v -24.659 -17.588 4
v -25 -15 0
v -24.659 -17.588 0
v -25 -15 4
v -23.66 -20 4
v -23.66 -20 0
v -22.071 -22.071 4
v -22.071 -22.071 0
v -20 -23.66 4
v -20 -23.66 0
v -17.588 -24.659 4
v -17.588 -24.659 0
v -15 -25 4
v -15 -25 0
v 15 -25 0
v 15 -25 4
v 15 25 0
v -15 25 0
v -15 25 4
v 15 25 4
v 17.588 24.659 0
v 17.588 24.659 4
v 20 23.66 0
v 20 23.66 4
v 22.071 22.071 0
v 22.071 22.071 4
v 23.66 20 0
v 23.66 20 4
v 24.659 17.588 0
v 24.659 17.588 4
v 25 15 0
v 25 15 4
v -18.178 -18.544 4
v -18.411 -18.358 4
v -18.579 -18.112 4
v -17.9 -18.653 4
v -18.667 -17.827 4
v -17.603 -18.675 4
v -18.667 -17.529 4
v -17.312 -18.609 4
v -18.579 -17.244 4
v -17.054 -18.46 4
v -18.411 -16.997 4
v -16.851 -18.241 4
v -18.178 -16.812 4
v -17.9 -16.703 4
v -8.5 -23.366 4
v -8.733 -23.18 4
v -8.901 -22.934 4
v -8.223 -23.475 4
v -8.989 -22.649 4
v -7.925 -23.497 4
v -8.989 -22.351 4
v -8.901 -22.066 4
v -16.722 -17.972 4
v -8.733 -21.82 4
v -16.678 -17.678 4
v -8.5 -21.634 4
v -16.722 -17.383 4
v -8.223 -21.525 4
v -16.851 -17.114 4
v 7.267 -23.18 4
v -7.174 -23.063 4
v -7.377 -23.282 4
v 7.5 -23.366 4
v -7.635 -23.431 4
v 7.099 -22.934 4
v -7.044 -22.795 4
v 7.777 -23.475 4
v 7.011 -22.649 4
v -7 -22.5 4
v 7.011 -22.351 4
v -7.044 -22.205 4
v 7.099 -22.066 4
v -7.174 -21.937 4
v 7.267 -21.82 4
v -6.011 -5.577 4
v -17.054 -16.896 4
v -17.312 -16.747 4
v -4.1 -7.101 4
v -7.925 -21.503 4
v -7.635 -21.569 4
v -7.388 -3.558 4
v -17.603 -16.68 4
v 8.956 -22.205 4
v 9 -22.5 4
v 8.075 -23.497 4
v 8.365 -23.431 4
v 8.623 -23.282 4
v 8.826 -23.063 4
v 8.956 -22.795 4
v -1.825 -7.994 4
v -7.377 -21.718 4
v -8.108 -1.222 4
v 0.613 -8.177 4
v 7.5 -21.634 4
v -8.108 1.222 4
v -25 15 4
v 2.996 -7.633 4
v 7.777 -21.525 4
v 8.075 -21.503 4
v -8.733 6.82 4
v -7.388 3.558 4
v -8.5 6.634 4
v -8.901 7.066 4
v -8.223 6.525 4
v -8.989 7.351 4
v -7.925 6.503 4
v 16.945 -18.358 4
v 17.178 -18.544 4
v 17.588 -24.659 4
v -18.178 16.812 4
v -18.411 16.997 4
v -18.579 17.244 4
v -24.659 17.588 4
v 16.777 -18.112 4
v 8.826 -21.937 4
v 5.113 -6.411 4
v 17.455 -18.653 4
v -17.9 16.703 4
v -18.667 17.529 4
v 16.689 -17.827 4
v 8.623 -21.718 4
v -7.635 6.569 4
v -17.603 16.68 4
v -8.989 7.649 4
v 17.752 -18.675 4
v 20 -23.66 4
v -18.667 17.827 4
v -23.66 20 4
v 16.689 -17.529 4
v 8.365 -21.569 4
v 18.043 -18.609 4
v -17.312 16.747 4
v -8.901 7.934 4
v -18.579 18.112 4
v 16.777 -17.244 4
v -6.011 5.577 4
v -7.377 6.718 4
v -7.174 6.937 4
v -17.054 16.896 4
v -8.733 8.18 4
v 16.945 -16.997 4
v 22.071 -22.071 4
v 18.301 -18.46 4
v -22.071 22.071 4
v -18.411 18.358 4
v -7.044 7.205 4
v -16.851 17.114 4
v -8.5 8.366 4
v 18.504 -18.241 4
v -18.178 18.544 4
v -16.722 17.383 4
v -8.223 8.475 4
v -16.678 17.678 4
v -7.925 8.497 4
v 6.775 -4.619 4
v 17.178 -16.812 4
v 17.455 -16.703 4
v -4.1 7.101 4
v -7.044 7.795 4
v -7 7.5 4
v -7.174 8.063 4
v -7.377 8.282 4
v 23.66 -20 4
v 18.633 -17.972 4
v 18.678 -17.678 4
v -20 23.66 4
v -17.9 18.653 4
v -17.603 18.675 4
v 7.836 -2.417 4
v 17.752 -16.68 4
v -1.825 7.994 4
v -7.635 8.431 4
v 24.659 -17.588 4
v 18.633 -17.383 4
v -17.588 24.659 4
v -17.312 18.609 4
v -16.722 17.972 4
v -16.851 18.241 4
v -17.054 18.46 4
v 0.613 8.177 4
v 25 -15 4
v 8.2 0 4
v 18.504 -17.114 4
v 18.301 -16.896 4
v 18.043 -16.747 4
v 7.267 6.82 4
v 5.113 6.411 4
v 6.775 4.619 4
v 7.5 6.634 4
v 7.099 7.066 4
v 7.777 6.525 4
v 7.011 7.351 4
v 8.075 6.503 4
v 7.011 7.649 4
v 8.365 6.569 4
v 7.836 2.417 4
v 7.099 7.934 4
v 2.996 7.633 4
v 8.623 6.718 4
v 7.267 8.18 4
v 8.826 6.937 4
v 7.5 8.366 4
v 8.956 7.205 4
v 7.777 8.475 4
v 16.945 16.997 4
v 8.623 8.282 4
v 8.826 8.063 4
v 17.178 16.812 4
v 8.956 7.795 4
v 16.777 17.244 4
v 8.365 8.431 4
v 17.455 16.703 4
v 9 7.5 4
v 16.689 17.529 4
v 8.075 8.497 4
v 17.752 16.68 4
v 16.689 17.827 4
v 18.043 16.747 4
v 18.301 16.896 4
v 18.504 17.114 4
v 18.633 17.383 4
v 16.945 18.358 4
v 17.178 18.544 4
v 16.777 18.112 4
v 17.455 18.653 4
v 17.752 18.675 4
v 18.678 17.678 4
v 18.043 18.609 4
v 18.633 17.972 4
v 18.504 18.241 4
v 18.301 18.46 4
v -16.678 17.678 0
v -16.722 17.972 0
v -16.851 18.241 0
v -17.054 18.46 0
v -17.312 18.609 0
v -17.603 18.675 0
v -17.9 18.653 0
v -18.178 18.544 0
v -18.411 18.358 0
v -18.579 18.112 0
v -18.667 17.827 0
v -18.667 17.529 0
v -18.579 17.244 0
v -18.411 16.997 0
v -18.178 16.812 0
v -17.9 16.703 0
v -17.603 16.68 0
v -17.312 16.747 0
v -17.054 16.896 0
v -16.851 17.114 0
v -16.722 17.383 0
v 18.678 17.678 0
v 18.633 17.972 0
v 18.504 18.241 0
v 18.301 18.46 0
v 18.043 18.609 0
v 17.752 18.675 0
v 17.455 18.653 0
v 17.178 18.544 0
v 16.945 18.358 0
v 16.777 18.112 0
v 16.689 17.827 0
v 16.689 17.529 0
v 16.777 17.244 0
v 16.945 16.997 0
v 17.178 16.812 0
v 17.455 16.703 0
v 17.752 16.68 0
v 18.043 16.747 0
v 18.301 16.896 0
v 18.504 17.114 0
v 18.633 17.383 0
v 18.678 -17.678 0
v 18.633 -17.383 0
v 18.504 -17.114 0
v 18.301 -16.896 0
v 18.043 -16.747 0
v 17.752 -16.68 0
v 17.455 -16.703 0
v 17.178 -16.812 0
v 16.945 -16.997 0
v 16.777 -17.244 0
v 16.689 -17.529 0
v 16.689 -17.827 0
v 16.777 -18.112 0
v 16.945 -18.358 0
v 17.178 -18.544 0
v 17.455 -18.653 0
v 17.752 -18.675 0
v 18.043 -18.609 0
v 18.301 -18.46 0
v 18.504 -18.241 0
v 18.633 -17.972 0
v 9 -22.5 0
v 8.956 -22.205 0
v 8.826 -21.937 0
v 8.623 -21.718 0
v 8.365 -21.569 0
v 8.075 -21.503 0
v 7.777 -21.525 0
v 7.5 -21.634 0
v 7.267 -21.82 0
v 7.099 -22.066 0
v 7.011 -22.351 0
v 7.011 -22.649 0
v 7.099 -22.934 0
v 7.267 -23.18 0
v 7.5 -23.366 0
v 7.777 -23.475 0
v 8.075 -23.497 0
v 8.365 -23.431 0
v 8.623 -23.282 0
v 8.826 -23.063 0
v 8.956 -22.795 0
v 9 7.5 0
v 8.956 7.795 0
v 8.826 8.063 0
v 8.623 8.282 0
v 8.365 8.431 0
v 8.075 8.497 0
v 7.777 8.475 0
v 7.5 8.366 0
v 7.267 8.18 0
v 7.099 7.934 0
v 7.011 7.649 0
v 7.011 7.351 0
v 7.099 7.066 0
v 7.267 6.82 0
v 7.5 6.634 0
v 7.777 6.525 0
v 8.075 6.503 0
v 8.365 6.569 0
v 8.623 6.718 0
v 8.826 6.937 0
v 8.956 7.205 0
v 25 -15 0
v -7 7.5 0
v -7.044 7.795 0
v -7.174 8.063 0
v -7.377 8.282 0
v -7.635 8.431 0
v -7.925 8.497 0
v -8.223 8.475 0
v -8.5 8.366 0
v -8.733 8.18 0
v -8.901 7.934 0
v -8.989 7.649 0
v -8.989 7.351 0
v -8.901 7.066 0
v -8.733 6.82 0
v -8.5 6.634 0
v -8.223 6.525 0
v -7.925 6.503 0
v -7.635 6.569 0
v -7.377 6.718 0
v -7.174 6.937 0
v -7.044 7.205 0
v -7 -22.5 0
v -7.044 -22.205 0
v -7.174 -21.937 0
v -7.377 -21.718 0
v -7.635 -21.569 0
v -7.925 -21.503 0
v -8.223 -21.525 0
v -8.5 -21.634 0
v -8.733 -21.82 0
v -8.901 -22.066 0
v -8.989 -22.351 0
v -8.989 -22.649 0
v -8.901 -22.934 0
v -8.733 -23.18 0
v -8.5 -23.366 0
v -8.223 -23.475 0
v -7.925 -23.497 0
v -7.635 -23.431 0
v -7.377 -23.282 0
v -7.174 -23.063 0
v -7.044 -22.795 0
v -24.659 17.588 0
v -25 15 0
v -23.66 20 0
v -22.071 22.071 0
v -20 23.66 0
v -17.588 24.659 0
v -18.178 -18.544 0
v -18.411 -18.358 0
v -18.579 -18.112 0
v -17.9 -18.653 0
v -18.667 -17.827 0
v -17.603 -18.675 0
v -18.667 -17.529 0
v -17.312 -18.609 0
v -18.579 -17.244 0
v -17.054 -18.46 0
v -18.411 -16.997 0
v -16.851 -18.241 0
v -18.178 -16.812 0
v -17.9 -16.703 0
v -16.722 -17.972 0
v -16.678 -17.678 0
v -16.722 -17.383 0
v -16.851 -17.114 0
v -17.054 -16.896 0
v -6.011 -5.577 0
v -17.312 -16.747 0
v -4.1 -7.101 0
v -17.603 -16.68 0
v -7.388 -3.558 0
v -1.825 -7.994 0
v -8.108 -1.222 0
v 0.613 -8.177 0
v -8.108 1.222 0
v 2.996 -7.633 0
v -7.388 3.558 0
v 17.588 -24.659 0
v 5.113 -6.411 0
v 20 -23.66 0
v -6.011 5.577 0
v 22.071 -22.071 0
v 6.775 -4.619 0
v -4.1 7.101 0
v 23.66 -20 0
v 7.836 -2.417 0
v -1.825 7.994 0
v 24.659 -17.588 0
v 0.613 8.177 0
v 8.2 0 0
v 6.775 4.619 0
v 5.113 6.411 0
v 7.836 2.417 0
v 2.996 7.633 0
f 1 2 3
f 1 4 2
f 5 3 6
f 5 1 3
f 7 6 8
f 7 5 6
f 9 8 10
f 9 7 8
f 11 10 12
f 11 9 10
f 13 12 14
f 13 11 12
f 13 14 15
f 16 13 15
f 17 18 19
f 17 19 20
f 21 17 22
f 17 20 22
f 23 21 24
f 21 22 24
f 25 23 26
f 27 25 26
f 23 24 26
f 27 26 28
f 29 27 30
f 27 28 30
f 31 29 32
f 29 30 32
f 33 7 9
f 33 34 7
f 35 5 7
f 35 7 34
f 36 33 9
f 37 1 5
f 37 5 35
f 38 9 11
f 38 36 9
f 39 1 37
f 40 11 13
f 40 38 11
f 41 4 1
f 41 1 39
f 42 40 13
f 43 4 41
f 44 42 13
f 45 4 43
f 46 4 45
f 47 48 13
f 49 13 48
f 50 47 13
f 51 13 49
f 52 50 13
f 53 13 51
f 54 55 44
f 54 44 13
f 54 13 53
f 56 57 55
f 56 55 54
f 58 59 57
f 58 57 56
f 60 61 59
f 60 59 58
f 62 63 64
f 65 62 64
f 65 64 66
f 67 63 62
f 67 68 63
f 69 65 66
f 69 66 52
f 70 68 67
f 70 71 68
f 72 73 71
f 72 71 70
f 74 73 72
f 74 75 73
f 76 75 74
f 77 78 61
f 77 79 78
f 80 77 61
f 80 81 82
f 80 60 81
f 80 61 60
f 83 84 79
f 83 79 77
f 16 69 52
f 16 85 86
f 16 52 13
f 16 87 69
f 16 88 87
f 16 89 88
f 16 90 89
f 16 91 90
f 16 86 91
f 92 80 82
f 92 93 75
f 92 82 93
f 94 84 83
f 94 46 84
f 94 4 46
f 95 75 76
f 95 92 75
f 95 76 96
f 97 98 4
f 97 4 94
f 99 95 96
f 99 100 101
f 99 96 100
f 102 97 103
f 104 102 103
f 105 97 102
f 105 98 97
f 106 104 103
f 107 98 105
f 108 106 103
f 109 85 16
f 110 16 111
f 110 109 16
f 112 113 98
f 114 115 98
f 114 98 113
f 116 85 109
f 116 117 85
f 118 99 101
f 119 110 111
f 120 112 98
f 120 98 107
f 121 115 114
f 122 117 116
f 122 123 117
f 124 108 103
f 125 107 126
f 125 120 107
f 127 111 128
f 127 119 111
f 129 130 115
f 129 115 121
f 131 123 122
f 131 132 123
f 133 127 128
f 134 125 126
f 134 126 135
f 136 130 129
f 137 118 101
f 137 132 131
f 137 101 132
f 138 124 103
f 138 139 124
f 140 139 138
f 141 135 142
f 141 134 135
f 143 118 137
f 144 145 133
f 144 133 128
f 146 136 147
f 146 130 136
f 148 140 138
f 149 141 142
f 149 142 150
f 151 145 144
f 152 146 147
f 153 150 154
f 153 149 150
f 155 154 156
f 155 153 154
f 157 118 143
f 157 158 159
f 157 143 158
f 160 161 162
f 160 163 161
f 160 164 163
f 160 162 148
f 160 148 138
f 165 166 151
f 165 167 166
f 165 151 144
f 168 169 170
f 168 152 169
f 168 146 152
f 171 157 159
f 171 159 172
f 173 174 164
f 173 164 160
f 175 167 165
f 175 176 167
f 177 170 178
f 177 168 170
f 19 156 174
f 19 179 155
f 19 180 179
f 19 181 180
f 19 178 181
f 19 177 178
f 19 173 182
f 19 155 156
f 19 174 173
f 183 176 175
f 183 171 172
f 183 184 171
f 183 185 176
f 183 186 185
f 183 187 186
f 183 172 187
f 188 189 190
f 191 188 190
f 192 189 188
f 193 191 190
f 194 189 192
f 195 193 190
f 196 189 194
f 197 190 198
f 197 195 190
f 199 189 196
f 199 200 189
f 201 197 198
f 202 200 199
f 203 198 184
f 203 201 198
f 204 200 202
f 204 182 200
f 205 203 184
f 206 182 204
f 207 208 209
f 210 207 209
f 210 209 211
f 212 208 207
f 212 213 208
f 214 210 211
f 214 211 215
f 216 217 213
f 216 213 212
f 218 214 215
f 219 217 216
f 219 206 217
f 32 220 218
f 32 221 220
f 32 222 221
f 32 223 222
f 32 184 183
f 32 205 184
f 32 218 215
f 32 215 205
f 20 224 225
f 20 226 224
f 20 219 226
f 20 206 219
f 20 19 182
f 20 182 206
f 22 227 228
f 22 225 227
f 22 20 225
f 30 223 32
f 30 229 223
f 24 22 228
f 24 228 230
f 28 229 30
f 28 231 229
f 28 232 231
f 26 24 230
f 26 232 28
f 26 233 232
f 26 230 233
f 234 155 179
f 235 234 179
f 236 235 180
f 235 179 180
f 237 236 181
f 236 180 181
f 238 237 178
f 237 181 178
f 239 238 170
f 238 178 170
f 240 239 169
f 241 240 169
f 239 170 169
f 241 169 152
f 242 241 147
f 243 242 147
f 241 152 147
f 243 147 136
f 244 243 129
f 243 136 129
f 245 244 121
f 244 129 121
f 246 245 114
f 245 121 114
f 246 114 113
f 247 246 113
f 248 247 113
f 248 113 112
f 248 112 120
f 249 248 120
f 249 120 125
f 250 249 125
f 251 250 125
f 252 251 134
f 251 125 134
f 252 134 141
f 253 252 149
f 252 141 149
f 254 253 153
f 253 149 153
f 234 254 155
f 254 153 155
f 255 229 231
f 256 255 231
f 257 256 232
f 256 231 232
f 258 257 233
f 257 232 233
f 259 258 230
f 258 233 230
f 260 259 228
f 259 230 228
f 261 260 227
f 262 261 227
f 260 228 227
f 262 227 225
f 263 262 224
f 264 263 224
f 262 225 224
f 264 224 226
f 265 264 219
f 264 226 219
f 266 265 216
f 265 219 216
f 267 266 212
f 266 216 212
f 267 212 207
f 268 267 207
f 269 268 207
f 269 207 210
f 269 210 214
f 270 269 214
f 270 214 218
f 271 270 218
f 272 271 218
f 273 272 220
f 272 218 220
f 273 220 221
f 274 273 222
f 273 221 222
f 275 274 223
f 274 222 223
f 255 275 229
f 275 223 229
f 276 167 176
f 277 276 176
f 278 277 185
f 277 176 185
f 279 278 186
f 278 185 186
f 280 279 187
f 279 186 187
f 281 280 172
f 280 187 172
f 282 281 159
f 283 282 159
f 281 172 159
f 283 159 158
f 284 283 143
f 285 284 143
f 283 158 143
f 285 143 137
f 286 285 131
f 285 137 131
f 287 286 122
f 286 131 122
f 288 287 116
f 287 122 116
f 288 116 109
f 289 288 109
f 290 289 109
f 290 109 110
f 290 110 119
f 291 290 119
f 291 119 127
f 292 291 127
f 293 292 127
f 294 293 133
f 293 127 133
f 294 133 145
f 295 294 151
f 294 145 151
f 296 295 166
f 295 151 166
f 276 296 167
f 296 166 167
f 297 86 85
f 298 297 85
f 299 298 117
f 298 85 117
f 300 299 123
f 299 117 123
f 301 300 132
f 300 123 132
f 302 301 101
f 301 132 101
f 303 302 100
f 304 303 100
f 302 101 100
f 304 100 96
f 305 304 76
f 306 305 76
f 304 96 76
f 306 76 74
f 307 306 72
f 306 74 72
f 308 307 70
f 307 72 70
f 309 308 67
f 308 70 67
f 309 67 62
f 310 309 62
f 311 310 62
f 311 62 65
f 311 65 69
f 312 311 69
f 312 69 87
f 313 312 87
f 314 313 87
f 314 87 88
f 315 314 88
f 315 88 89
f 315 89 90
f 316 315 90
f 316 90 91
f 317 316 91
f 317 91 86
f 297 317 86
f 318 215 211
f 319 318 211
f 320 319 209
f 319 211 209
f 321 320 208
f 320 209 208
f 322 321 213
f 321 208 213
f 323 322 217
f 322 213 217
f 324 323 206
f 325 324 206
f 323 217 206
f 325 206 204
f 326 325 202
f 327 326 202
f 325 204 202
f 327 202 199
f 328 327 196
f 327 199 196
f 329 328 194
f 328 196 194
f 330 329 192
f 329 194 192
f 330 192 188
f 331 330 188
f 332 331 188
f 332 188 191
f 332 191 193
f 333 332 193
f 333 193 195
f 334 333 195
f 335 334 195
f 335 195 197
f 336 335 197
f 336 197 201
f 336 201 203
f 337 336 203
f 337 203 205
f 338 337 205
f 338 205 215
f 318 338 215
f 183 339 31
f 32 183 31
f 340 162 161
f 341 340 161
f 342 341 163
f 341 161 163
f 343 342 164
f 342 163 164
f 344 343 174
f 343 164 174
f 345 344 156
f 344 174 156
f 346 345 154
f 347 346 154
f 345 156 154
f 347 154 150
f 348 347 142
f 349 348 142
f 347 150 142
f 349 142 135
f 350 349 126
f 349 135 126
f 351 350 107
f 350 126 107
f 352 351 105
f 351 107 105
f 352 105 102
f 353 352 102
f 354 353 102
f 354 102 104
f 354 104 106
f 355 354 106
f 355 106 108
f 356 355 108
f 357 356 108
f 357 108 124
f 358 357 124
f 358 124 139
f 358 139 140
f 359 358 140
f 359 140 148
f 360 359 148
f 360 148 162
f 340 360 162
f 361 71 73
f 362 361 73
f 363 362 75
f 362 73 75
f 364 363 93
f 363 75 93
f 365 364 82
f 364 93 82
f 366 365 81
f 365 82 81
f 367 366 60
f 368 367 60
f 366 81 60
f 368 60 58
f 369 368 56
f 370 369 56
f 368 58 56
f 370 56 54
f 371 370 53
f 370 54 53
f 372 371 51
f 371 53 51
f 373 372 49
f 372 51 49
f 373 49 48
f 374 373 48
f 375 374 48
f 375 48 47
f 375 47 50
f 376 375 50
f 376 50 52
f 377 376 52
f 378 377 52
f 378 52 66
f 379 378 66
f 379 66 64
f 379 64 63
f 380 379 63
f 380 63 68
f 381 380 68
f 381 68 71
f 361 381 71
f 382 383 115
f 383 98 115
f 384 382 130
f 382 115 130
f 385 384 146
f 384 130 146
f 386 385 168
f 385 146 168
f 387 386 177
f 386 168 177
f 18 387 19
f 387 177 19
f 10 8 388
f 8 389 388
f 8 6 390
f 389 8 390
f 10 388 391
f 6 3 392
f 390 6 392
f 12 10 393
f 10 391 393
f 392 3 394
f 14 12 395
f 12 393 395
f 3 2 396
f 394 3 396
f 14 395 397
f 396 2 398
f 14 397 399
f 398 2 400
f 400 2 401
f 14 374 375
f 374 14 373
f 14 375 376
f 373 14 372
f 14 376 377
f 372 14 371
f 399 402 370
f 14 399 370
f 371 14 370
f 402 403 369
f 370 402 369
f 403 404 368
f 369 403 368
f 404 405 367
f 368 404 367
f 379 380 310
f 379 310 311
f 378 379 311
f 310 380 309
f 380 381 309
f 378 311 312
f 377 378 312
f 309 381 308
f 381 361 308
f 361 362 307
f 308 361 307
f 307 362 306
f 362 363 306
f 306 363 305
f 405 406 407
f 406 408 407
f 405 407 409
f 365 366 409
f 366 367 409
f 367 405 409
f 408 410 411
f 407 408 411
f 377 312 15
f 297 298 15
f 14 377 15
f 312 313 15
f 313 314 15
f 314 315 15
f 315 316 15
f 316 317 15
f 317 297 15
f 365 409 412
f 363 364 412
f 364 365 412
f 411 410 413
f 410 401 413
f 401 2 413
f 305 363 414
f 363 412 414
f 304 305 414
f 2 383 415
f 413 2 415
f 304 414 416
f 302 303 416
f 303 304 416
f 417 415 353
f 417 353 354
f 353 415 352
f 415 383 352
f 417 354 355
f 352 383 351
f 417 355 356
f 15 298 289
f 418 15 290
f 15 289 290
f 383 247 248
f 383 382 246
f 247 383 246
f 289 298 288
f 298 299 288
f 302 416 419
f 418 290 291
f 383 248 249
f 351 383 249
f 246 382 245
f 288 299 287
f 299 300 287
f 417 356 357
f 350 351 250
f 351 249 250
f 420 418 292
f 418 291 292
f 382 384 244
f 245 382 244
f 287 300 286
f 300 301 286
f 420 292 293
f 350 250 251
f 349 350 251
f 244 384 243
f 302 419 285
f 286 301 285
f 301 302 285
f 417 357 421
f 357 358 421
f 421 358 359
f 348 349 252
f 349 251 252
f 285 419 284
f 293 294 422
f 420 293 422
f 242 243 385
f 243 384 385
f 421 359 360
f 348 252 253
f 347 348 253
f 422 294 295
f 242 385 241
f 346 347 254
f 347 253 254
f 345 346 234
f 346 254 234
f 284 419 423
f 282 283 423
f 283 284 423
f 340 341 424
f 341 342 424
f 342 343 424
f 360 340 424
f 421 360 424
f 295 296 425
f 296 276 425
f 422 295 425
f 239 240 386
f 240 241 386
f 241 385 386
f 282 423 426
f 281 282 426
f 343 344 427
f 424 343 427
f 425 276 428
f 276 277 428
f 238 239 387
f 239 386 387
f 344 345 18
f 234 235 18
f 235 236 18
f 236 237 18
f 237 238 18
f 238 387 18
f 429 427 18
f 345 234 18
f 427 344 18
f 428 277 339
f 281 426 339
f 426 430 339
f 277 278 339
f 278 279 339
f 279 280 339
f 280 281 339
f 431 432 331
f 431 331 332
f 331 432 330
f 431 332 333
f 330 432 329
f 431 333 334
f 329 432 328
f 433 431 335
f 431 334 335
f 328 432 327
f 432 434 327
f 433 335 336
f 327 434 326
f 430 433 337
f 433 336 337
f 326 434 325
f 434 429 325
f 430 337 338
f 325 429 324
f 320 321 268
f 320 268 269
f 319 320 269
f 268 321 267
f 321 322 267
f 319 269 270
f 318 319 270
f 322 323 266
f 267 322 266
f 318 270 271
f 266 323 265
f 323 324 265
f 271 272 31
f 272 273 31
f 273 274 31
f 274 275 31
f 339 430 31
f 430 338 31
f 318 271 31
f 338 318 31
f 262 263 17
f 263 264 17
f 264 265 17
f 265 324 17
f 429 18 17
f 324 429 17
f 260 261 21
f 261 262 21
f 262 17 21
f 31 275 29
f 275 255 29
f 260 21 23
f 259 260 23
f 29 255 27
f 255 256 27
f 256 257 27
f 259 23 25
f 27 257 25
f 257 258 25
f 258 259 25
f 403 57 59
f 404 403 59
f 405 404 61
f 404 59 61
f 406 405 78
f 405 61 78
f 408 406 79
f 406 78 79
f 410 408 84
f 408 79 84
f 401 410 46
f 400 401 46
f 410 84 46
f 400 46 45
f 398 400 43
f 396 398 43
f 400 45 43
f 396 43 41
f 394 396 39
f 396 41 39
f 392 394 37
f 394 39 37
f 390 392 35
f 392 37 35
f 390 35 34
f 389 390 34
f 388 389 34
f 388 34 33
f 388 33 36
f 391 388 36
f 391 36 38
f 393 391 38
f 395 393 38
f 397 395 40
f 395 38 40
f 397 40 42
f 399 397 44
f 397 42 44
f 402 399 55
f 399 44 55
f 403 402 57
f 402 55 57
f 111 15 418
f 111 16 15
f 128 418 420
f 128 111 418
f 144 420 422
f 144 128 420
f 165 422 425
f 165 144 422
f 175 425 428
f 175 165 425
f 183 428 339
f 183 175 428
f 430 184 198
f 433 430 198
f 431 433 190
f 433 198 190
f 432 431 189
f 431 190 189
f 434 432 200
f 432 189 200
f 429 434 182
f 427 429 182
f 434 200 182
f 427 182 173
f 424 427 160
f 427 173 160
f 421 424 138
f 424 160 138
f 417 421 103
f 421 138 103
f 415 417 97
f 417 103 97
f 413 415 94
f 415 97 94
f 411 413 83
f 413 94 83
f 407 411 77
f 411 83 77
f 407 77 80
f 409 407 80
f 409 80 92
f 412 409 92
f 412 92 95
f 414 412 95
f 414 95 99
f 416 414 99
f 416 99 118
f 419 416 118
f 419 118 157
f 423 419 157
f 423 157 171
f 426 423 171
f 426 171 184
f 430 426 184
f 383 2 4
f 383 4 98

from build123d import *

# Parameters (mm, degrees)
SKETCH1_W           = 50
SKETCH1_H           = 50
BOSS_EXTRUDE1_DEPTH = 4
SKETCH2_R           = 8.2
SKETCH2_R_2         = 1
CUT_EXTRUDE1_DEPTH  = 10
SKETCH3_R           = 1
CUT_EXTRUDE2_DEPTH  = 4
FILLET1_R           = 10


with BuildPart() as part:
    # Sketch1 → Boss-Extrude1 (new body)
    with BuildSketch(Plane.XY):
        Rectangle(SKETCH1_W, SKETCH1_H)
    extrude(amount=BOSS_EXTRUDE1_DEPTH)

    # Sketch2 → Cut-Extrude1 (cut)
    with BuildSketch(Plane.XY.offset(4)):
        Circle(SKETCH2_R)
        with Locations((-8, 7.5)):
            Circle(SKETCH2_R_2)
        with Locations((8, 7.5)):
            Circle(SKETCH2_R_2)
        with Locations((-8, -22.5)):
            Circle(SKETCH2_R_2)
        with Locations((8, -22.5)):
            Circle(SKETCH2_R_2)
    extrude(amount=-CUT_EXTRUDE1_DEPTH, mode=Mode.SUBTRACT)

    # Sketch3 → Cut-Extrude2 (cut)
    with BuildSketch(Plane.XY.offset(4)):
        with Locations((-17.67766953, 17.67766953)):
            Circle(SKETCH3_R)
        with Locations((17.67766953, 17.67766953)):
            Circle(SKETCH3_R)
        with Locations((17.67766953, -17.67766953)):
            Circle(SKETCH3_R)
        with Locations((-17.67766953, -17.67766953)):
            Circle(SKETCH3_R)
    extrude(amount=-CUT_EXTRUDE2_DEPTH, mode=Mode.SUBTRACT)

    # Fillet1
    fillet1_edges = [part.edges().sort_by_distance(p)[0] for p in [
        (25, -25, 2),
        (-25, -25, 2),
        (-25, 25, 2),
        (25, 25, 2),
    ]]
    fillet(fillet1_edges, radius=FILLET1_R)


solid = part.part
